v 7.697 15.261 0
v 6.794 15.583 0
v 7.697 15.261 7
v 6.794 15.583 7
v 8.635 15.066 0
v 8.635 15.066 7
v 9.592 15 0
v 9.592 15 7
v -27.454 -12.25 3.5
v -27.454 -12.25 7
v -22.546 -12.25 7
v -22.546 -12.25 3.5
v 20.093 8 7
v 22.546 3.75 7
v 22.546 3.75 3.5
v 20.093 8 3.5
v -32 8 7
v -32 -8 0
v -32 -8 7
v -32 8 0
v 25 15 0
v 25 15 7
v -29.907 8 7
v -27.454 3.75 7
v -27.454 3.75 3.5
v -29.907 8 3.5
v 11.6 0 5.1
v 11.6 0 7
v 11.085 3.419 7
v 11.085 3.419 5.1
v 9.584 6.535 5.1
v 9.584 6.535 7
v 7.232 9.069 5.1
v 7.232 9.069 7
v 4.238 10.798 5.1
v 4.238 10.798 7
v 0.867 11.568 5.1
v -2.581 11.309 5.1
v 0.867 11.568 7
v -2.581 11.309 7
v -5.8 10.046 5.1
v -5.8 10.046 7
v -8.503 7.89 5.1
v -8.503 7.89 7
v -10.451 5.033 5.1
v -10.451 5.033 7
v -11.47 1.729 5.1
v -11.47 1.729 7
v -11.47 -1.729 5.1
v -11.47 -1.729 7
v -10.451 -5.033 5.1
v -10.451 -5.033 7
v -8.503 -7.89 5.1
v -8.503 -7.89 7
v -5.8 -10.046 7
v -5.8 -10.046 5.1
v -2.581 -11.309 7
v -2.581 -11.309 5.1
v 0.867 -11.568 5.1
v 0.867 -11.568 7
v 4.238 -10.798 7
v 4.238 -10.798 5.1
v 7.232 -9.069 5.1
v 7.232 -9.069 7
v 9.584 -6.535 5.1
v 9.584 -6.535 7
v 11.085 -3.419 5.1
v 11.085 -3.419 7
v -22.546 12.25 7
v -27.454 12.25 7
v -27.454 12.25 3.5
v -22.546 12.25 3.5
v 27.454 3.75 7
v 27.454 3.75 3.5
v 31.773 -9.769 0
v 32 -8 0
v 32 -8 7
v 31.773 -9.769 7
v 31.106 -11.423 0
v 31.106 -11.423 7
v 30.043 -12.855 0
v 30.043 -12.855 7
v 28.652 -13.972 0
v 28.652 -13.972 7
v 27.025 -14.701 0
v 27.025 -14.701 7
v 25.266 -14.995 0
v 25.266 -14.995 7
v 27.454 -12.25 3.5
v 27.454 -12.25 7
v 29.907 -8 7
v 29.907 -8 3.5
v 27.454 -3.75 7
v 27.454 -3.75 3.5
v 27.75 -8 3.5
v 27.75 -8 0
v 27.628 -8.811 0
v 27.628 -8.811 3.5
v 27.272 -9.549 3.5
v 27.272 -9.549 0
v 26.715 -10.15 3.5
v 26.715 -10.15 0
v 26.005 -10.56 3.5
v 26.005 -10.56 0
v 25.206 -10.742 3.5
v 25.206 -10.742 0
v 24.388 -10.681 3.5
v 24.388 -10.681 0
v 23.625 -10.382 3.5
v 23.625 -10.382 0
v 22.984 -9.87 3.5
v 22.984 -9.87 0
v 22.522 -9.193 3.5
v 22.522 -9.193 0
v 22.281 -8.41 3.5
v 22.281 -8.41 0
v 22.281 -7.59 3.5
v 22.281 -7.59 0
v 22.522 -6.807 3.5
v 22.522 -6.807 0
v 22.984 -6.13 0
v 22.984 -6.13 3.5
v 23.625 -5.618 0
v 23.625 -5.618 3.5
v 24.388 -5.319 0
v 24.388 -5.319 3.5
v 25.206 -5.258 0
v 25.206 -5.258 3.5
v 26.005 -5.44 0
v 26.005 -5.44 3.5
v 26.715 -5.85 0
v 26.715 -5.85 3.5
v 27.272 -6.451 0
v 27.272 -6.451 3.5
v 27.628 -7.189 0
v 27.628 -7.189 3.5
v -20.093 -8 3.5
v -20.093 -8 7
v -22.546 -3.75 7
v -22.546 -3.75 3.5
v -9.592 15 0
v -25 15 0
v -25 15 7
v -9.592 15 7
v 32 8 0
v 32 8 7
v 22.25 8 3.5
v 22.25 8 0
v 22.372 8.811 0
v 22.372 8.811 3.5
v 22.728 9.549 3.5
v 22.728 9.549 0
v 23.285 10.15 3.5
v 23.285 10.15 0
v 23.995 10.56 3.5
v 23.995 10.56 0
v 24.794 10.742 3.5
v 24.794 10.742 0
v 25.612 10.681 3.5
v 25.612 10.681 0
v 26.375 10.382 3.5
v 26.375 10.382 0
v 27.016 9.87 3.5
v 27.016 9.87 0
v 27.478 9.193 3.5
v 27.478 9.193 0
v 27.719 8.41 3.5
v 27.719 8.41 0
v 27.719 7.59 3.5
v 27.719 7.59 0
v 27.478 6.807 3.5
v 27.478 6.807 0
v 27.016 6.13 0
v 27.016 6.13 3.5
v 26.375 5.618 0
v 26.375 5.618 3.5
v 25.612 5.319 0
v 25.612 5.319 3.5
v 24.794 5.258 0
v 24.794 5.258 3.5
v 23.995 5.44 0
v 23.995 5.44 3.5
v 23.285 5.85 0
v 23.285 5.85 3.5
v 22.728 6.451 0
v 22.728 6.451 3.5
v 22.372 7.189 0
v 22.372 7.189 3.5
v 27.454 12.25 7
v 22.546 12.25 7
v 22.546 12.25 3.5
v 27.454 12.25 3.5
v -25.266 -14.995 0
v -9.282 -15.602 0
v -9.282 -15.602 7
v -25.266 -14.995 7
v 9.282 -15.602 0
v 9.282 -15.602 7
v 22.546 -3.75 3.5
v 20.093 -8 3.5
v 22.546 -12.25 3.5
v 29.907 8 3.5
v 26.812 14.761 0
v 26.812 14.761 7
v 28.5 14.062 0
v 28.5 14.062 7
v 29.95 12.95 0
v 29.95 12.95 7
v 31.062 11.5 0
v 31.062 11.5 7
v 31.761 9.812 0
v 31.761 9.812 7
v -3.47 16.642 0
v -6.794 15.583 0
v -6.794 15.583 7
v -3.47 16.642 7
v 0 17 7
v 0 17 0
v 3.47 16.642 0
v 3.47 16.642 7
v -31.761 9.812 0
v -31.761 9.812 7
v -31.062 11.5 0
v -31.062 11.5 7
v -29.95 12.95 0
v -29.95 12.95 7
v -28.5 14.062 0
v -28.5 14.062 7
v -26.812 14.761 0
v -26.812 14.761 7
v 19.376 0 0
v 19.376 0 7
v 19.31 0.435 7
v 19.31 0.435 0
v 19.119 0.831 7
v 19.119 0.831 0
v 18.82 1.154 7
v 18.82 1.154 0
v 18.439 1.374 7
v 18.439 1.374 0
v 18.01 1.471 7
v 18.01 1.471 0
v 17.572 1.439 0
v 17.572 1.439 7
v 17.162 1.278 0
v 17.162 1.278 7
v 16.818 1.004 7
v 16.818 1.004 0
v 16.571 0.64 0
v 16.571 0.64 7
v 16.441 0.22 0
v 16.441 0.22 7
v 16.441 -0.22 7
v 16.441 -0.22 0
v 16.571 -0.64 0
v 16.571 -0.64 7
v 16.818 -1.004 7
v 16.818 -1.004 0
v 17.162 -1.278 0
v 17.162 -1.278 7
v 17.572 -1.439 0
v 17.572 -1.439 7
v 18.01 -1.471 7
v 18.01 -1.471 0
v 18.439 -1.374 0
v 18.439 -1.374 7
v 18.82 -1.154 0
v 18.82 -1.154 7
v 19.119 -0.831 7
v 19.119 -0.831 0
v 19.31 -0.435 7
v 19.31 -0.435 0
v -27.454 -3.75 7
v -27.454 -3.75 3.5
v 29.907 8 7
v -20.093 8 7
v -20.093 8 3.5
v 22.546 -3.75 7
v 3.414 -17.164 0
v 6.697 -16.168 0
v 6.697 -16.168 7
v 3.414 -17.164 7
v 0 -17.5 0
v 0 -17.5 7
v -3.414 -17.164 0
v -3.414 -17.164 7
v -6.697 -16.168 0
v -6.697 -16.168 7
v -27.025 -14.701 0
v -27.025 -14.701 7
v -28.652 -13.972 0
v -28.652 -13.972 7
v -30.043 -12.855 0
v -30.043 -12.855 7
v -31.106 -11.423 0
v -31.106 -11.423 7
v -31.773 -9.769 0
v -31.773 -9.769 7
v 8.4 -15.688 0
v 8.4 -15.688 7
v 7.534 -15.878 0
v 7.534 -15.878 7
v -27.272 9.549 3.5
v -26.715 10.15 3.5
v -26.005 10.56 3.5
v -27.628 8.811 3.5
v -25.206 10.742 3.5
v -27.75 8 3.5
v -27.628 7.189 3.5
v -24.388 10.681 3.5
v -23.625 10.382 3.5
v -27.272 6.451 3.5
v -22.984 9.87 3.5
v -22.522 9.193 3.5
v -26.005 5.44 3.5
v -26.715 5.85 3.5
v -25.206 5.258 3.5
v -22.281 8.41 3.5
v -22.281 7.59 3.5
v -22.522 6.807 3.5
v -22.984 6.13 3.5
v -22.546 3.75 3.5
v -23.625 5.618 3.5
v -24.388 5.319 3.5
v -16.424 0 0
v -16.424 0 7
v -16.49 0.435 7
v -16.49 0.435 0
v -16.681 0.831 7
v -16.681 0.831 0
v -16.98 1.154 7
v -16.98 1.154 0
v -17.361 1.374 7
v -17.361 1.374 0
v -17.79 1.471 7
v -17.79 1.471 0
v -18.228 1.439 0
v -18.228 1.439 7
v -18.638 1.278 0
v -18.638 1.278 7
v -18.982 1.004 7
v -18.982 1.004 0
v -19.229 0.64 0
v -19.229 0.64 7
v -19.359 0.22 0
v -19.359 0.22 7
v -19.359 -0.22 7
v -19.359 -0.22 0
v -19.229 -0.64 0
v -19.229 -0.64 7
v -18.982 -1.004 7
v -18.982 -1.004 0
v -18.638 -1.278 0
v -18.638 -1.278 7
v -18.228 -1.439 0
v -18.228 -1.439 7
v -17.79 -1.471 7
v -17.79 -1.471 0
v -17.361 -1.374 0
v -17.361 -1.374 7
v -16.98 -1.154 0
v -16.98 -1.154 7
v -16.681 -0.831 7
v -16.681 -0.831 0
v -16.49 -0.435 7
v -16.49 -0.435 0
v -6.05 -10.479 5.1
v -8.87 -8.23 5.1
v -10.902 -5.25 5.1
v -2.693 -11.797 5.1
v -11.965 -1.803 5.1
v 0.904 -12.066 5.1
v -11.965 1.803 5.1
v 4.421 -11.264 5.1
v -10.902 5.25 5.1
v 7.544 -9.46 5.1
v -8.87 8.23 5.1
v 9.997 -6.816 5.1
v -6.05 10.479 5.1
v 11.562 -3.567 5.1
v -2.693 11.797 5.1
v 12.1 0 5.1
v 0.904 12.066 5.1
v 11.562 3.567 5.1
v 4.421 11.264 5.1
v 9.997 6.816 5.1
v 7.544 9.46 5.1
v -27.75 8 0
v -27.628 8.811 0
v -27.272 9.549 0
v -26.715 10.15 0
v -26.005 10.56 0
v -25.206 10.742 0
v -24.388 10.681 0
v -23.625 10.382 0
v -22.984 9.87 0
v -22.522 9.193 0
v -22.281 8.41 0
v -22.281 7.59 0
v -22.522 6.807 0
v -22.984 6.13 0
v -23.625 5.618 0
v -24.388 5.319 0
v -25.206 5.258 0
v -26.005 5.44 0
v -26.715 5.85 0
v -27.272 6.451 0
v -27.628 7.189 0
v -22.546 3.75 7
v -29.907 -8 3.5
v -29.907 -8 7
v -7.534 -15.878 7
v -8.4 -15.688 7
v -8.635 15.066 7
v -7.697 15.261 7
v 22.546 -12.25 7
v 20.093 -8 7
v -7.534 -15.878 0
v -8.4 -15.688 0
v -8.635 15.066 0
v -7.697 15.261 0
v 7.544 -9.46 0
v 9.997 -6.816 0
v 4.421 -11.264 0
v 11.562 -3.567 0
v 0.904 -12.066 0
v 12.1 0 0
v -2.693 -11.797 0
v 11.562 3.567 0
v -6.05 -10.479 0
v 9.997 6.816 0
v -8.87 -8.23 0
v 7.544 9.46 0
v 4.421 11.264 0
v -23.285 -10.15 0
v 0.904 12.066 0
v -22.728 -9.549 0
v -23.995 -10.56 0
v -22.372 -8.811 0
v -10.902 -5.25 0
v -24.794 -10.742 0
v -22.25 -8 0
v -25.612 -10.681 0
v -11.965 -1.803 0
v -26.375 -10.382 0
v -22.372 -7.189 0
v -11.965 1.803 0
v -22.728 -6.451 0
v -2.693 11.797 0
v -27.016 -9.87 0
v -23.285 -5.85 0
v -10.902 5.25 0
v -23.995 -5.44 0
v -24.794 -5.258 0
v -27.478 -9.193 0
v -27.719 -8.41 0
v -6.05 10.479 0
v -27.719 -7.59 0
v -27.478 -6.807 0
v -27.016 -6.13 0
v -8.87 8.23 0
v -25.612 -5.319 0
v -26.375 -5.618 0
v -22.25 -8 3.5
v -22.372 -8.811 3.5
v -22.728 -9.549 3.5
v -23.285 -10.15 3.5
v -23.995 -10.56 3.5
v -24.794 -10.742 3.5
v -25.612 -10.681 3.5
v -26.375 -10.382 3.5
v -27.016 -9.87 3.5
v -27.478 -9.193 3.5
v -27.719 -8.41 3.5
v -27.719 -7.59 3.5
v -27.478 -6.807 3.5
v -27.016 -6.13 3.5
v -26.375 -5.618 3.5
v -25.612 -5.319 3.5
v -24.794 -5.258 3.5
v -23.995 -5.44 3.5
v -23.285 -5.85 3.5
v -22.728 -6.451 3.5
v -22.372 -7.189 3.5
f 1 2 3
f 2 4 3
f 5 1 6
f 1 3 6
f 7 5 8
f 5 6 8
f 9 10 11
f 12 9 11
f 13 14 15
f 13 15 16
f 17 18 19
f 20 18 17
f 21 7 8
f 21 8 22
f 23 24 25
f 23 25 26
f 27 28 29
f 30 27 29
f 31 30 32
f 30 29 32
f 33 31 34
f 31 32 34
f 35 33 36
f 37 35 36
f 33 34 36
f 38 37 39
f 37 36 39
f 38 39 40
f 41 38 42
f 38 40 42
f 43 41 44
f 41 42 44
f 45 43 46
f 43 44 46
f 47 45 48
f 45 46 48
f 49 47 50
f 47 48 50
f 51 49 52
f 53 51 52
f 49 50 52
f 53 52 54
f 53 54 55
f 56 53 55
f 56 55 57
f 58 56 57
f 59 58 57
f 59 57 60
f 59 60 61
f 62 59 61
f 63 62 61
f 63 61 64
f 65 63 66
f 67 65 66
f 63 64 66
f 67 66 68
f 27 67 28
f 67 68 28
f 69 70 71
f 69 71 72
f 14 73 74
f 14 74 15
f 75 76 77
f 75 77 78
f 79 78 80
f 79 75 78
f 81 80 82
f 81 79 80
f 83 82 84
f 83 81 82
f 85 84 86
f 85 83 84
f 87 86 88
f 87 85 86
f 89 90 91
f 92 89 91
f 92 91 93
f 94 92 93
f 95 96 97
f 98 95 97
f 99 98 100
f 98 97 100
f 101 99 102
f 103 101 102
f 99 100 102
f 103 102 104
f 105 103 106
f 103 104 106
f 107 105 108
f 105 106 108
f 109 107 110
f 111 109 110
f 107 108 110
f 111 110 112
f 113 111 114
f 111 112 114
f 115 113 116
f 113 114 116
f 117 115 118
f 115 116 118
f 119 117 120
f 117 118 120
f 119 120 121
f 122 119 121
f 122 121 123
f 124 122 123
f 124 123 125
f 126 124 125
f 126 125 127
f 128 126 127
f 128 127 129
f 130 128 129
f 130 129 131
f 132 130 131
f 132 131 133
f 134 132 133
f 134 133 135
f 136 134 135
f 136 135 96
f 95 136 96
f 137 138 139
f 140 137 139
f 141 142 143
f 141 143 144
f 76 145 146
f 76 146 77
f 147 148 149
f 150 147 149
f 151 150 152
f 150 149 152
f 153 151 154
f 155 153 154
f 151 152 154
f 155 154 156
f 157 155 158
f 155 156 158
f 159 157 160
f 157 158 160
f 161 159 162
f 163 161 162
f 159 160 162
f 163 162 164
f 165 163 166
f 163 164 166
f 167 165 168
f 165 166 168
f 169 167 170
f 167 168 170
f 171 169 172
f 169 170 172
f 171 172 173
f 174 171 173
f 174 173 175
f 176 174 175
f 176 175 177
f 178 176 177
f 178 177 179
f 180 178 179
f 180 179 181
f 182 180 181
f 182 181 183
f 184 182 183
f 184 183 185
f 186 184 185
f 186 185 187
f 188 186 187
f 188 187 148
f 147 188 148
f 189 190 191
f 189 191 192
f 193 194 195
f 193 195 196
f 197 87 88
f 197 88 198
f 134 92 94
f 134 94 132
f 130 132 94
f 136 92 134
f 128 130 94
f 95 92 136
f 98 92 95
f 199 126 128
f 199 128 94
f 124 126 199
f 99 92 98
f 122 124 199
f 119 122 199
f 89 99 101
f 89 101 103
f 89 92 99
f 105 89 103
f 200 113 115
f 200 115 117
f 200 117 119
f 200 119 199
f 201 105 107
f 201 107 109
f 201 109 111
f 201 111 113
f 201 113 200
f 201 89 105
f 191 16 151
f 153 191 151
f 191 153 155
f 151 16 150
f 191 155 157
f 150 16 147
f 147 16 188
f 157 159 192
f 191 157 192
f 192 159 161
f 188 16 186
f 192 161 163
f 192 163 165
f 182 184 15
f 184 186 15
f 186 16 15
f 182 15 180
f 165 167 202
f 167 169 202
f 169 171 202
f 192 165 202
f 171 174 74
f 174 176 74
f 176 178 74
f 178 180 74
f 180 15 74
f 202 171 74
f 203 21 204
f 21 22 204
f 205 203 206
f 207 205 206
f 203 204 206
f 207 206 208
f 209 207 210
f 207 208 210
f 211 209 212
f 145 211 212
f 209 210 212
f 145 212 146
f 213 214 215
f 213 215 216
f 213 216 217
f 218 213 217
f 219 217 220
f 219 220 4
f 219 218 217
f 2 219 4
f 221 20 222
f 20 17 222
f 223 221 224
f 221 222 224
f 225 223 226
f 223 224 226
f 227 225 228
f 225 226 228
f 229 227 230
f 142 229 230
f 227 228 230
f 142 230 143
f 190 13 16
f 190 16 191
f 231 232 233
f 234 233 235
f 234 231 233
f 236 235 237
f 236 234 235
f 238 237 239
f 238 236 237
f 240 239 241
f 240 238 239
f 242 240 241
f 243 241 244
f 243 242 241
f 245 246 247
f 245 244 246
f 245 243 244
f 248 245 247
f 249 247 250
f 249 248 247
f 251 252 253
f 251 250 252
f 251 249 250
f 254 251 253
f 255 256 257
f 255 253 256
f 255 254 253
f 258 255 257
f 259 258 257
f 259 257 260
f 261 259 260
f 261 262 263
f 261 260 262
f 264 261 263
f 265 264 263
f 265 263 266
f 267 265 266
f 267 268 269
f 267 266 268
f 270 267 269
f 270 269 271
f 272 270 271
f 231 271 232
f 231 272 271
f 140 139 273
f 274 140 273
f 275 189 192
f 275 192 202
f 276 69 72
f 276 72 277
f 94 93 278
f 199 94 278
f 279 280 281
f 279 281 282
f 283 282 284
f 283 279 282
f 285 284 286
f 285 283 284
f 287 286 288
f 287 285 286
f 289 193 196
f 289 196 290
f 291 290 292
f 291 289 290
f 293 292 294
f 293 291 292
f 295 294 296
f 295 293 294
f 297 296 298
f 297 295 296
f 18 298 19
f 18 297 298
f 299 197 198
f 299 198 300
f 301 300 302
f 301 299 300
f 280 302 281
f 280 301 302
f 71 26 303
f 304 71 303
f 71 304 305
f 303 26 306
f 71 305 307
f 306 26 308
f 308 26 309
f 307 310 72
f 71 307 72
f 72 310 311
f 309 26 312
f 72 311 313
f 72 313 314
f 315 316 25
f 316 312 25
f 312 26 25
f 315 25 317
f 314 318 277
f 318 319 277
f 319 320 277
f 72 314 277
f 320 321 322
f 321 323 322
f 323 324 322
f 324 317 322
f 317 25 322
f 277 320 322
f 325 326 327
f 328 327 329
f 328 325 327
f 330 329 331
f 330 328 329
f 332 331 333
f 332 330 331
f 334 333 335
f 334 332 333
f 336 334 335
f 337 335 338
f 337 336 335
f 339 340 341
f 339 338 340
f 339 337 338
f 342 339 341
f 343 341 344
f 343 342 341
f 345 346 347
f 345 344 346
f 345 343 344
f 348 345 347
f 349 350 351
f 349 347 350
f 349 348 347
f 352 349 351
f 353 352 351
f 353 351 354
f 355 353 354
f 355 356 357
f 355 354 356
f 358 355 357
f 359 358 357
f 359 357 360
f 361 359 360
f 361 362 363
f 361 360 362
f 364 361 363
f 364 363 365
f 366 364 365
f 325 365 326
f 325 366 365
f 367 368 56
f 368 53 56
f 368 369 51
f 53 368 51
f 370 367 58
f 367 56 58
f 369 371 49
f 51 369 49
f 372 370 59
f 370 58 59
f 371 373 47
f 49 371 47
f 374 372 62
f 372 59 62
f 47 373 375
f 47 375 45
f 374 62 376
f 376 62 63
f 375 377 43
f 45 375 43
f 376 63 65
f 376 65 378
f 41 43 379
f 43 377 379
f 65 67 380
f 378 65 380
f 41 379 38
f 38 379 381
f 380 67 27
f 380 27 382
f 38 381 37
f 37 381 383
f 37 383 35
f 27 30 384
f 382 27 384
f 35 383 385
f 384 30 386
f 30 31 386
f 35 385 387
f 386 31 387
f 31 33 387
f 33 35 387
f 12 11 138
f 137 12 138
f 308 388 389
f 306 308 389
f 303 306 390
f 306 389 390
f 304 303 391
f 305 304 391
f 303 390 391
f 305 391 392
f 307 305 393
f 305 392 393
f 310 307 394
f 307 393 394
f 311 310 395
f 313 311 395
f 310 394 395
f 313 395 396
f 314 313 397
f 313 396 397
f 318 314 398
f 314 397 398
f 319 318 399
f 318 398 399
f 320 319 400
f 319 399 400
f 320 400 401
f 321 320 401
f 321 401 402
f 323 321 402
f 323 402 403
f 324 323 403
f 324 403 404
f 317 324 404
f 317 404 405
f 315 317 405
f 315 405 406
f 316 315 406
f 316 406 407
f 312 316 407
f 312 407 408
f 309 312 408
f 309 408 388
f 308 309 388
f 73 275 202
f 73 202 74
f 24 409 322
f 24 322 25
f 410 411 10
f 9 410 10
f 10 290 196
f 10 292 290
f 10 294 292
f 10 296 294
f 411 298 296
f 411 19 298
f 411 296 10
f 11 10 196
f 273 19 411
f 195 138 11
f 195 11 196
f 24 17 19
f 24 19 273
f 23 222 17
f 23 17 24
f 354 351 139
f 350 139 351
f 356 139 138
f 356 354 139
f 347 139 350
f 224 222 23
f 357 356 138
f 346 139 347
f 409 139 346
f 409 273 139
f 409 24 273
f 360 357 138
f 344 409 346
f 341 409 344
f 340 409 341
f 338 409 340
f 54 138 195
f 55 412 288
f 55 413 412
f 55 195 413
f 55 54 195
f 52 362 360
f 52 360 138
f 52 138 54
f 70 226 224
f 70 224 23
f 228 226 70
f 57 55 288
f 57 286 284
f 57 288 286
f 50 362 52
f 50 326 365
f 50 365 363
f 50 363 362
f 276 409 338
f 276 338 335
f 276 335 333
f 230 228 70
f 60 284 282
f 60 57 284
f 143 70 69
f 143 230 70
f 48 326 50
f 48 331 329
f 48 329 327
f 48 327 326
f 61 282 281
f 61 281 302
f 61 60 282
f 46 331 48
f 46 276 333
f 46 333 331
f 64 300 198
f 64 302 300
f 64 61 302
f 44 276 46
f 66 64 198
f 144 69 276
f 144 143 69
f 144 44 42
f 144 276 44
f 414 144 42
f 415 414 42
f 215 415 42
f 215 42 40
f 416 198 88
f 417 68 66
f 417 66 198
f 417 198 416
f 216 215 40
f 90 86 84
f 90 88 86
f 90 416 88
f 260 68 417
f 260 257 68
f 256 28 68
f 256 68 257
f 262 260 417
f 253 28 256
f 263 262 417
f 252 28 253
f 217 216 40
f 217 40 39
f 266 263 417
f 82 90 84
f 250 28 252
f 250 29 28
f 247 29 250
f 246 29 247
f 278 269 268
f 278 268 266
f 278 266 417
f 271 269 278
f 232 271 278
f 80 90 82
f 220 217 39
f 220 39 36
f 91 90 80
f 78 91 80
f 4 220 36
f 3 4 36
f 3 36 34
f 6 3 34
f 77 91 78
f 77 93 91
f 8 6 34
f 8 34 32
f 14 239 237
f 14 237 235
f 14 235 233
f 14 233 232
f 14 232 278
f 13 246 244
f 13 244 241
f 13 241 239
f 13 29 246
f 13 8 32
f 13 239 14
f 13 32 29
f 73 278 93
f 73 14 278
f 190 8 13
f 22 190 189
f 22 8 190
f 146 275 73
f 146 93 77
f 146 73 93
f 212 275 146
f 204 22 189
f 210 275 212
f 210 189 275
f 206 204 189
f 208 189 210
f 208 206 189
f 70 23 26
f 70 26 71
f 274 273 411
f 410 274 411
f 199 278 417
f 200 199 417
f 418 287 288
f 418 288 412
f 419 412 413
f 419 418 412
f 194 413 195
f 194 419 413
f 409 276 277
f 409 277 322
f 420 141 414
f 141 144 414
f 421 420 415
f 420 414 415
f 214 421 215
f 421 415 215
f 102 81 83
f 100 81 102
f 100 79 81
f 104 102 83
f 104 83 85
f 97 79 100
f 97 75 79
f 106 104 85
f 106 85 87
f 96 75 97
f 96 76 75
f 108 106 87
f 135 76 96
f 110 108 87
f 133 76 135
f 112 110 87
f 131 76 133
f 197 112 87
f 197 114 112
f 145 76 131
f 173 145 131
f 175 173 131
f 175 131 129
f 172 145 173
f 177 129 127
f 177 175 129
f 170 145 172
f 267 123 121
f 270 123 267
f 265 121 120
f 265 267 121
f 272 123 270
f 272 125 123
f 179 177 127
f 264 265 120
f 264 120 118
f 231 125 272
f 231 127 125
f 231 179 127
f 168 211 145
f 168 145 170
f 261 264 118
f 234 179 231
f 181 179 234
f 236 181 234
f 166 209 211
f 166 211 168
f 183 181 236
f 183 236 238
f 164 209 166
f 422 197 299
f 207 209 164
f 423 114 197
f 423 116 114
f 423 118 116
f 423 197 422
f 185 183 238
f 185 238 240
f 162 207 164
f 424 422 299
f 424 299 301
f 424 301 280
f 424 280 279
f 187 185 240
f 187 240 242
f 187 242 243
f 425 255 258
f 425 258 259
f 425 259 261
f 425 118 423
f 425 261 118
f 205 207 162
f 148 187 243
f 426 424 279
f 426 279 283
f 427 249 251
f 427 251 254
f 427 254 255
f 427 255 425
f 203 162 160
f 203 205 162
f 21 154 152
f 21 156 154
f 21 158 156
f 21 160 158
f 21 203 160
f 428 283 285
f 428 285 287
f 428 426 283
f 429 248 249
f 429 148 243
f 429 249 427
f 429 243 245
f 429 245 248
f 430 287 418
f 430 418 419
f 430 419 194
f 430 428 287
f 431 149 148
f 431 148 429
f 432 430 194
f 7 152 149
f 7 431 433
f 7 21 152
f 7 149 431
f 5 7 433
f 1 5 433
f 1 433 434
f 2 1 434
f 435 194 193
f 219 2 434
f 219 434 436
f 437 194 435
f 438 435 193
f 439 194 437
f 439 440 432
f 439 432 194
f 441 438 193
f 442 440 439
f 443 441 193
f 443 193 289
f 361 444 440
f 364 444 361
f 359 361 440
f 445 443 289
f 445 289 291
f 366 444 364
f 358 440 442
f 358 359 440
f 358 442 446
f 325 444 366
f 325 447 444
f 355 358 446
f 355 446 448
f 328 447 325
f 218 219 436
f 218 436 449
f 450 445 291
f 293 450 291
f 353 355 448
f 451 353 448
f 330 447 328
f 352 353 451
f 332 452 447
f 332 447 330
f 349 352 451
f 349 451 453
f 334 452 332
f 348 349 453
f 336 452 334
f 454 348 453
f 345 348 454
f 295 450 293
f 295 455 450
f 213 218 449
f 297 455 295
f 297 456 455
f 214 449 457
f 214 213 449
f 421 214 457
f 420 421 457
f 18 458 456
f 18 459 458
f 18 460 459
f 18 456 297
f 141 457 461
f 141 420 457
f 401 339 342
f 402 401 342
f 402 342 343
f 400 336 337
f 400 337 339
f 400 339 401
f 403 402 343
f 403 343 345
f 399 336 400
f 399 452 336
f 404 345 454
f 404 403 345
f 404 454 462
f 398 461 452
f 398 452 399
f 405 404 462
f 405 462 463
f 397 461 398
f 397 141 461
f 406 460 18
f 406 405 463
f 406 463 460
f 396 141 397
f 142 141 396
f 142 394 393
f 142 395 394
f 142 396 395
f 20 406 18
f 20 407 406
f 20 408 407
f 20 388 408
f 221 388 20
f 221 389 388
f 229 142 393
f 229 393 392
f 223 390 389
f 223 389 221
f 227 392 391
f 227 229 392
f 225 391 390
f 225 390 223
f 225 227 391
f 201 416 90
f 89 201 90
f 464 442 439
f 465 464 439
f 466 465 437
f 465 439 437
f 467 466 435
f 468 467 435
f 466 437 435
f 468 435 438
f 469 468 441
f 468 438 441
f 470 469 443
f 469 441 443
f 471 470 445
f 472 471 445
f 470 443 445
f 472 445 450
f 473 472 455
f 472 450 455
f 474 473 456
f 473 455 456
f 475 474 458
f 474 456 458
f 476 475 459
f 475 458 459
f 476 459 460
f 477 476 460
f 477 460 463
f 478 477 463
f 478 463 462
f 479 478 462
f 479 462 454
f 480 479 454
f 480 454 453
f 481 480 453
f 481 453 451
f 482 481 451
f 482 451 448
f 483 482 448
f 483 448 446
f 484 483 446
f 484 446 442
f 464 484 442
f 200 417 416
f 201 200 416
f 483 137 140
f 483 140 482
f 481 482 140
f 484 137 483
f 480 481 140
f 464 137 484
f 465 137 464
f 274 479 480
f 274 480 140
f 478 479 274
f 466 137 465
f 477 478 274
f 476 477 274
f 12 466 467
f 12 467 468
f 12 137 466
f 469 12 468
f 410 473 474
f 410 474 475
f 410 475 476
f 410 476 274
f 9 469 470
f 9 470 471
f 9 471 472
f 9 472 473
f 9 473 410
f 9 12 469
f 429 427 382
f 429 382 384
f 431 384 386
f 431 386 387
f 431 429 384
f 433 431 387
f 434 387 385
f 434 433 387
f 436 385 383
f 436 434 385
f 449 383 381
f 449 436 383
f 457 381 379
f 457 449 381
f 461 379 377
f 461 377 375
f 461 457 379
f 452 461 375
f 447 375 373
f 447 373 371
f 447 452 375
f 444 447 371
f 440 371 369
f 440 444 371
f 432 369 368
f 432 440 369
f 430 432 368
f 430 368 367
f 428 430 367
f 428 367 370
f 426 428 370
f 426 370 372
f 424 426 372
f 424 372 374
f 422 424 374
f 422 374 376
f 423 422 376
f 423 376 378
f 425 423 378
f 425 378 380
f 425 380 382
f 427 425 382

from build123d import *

# Parameters (mm, degrees)
SKETCH_1_R          = 12.1
EXTRUDE_1_DEPTH     = 7
FILLET_3_R          = 7
SKETCH_7_R          = 12.1
SKETCH_7_R_2        = 11.6
EXTRUDE_2_DEPTH     = 1.9
HOLE_WIZARD_M53_D   = 5.5
HOLE_WIZARD_M54_D   = 5.5
CUT_EXTRUDE_1_DEPTH = 3.5
SKETCH1_R           = 1.475614807
CUT_EXTRUDE1_DEPTH  = 10


with BuildPart() as part:
    # Эскиз1 → Бобышка-Вытянуть1 (new body)
    with BuildSketch(Plane.XY):
        with BuildLine():
            Line((-9.282257481, -15.602398743), (-25.265839773, -14.994950265))
            ThreePointArc((-25.265839773, -14.994950265), (-30.042860221, -12.854849204), (-32, -8))
            Line((-32, -8), (-32, 15))
            Line((-32, 15), (-8, 15))
            ThreePointArc((-8, 15), (0, 17), (8, 15))
            Line((8, 15), (32, 15))
            Line((32, 15), (32, -8))
            ThreePointArc((32, -8), (30.042860221, -12.854849204), (25.265839773, -14.994950265))
            Line((25.265839773, -14.994950265), (9.282257481, -15.602398743))
            ThreePointArc((9.282257481, -15.602398743), (7.964469385, -15.770214084), (6.696960066, -16.167891819))
            ThreePointArc((6.696960066, -16.167891819), (0, -17.5), (-6.696960066, -16.167891819))
            ThreePointArc((-6.696960066, -16.167891819), (-7.964469385, -15.770214084), (-9.282257481, -15.602398743))
        make_face()
        Circle(SKETCH_1_R, mode=Mode.SUBTRACT)
    extrude(amount=EXTRUDE_1_DEPTH)

    # Скругление3
    fillet_3_edges = [part.edges().sort_by_distance(p)[0] for p in [
        (-32, 15, 3.5),
        (-8, 15, 3.5),
        (8, 15, 3.5),
        (32, 15, 3.5),
    ]]
    fillet(fillet_3_edges, radius=FILLET_3_R)

    # Эскиз7 → Бобышка-Вытянуть2 (add)
    with BuildSketch(Plane.XY.offset(7)):
        Circle(SKETCH_7_R)
        Circle(SKETCH_7_R_2, mode=Mode.SUBTRACT)
    extrude(amount=-EXTRUDE_2_DEPTH)

    # Отверстие с зазором M53 (through all)
    with Locations(Plane.XY.offset(7)):
        with Locations((-25, 8), (25, 8)):
            Hole(HOLE_WIZARD_M53_D / 2)

    # Отверстие с зазором M54 (through all)
    with Locations(Plane(origin=(-20.850360387, 7.199740636, 7), x_dir=(-1, 0, 0), z_dir=(0, 0, 1))):
        with Locations((-45.850360387, 15.199740636), (4.149639613, 15.199740636)):
            Hole(HOLE_WIZARD_M54_D / 2)

    # Эскиз18 → Вырез-Вытянуть1 (cut)
    with BuildSketch(Plane(origin=(0, 0, 7), x_dir=(1, 0, 0), z_dir=(0, 0, -1))):
        Polygon((20.092522712, -8), (22.546261356, -12.25), (27.453738644, -12.25), (29.907477288, -8), (27.453738644, -3.75), (22.546261356, -3.75), align=None)
        Polygon((-27.453738644, -3.75), (-29.907477288, -8), (-27.453738644, -12.25), (-22.546261356, -12.25), (-20.092522712, -8), (-22.546261356, -3.75), align=None)
        Polygon((20.092522712, 8), (22.546261356, 12.25), (27.453738644, 12.25), (29.907477288, 8), (27.453738644, 3.75), (22.546261356, 3.75), align=None)
        Polygon((-22.546261356, 12.25), (-20.092522712, 8), (-22.546261356, 3.75), (-27.453738644, 3.75), (-29.907477288, 8), (-27.453738644, 12.25), align=None)
    extrude(amount=CUT_EXTRUDE_1_DEPTH, mode=Mode.SUBTRACT)

    # Sketch1 → Cut-Extrude1 (cut)
    with BuildSketch(Plane.XY):
        with Locations((17.9, 0)):
            Circle(SKETCH1_R)
        with Locations((-17.9, 0)):
            Circle(SKETCH1_R)
    extrude(amount=CUT_EXTRUDE1_DEPTH, mode=Mode.SUBTRACT)


solid = part.part
